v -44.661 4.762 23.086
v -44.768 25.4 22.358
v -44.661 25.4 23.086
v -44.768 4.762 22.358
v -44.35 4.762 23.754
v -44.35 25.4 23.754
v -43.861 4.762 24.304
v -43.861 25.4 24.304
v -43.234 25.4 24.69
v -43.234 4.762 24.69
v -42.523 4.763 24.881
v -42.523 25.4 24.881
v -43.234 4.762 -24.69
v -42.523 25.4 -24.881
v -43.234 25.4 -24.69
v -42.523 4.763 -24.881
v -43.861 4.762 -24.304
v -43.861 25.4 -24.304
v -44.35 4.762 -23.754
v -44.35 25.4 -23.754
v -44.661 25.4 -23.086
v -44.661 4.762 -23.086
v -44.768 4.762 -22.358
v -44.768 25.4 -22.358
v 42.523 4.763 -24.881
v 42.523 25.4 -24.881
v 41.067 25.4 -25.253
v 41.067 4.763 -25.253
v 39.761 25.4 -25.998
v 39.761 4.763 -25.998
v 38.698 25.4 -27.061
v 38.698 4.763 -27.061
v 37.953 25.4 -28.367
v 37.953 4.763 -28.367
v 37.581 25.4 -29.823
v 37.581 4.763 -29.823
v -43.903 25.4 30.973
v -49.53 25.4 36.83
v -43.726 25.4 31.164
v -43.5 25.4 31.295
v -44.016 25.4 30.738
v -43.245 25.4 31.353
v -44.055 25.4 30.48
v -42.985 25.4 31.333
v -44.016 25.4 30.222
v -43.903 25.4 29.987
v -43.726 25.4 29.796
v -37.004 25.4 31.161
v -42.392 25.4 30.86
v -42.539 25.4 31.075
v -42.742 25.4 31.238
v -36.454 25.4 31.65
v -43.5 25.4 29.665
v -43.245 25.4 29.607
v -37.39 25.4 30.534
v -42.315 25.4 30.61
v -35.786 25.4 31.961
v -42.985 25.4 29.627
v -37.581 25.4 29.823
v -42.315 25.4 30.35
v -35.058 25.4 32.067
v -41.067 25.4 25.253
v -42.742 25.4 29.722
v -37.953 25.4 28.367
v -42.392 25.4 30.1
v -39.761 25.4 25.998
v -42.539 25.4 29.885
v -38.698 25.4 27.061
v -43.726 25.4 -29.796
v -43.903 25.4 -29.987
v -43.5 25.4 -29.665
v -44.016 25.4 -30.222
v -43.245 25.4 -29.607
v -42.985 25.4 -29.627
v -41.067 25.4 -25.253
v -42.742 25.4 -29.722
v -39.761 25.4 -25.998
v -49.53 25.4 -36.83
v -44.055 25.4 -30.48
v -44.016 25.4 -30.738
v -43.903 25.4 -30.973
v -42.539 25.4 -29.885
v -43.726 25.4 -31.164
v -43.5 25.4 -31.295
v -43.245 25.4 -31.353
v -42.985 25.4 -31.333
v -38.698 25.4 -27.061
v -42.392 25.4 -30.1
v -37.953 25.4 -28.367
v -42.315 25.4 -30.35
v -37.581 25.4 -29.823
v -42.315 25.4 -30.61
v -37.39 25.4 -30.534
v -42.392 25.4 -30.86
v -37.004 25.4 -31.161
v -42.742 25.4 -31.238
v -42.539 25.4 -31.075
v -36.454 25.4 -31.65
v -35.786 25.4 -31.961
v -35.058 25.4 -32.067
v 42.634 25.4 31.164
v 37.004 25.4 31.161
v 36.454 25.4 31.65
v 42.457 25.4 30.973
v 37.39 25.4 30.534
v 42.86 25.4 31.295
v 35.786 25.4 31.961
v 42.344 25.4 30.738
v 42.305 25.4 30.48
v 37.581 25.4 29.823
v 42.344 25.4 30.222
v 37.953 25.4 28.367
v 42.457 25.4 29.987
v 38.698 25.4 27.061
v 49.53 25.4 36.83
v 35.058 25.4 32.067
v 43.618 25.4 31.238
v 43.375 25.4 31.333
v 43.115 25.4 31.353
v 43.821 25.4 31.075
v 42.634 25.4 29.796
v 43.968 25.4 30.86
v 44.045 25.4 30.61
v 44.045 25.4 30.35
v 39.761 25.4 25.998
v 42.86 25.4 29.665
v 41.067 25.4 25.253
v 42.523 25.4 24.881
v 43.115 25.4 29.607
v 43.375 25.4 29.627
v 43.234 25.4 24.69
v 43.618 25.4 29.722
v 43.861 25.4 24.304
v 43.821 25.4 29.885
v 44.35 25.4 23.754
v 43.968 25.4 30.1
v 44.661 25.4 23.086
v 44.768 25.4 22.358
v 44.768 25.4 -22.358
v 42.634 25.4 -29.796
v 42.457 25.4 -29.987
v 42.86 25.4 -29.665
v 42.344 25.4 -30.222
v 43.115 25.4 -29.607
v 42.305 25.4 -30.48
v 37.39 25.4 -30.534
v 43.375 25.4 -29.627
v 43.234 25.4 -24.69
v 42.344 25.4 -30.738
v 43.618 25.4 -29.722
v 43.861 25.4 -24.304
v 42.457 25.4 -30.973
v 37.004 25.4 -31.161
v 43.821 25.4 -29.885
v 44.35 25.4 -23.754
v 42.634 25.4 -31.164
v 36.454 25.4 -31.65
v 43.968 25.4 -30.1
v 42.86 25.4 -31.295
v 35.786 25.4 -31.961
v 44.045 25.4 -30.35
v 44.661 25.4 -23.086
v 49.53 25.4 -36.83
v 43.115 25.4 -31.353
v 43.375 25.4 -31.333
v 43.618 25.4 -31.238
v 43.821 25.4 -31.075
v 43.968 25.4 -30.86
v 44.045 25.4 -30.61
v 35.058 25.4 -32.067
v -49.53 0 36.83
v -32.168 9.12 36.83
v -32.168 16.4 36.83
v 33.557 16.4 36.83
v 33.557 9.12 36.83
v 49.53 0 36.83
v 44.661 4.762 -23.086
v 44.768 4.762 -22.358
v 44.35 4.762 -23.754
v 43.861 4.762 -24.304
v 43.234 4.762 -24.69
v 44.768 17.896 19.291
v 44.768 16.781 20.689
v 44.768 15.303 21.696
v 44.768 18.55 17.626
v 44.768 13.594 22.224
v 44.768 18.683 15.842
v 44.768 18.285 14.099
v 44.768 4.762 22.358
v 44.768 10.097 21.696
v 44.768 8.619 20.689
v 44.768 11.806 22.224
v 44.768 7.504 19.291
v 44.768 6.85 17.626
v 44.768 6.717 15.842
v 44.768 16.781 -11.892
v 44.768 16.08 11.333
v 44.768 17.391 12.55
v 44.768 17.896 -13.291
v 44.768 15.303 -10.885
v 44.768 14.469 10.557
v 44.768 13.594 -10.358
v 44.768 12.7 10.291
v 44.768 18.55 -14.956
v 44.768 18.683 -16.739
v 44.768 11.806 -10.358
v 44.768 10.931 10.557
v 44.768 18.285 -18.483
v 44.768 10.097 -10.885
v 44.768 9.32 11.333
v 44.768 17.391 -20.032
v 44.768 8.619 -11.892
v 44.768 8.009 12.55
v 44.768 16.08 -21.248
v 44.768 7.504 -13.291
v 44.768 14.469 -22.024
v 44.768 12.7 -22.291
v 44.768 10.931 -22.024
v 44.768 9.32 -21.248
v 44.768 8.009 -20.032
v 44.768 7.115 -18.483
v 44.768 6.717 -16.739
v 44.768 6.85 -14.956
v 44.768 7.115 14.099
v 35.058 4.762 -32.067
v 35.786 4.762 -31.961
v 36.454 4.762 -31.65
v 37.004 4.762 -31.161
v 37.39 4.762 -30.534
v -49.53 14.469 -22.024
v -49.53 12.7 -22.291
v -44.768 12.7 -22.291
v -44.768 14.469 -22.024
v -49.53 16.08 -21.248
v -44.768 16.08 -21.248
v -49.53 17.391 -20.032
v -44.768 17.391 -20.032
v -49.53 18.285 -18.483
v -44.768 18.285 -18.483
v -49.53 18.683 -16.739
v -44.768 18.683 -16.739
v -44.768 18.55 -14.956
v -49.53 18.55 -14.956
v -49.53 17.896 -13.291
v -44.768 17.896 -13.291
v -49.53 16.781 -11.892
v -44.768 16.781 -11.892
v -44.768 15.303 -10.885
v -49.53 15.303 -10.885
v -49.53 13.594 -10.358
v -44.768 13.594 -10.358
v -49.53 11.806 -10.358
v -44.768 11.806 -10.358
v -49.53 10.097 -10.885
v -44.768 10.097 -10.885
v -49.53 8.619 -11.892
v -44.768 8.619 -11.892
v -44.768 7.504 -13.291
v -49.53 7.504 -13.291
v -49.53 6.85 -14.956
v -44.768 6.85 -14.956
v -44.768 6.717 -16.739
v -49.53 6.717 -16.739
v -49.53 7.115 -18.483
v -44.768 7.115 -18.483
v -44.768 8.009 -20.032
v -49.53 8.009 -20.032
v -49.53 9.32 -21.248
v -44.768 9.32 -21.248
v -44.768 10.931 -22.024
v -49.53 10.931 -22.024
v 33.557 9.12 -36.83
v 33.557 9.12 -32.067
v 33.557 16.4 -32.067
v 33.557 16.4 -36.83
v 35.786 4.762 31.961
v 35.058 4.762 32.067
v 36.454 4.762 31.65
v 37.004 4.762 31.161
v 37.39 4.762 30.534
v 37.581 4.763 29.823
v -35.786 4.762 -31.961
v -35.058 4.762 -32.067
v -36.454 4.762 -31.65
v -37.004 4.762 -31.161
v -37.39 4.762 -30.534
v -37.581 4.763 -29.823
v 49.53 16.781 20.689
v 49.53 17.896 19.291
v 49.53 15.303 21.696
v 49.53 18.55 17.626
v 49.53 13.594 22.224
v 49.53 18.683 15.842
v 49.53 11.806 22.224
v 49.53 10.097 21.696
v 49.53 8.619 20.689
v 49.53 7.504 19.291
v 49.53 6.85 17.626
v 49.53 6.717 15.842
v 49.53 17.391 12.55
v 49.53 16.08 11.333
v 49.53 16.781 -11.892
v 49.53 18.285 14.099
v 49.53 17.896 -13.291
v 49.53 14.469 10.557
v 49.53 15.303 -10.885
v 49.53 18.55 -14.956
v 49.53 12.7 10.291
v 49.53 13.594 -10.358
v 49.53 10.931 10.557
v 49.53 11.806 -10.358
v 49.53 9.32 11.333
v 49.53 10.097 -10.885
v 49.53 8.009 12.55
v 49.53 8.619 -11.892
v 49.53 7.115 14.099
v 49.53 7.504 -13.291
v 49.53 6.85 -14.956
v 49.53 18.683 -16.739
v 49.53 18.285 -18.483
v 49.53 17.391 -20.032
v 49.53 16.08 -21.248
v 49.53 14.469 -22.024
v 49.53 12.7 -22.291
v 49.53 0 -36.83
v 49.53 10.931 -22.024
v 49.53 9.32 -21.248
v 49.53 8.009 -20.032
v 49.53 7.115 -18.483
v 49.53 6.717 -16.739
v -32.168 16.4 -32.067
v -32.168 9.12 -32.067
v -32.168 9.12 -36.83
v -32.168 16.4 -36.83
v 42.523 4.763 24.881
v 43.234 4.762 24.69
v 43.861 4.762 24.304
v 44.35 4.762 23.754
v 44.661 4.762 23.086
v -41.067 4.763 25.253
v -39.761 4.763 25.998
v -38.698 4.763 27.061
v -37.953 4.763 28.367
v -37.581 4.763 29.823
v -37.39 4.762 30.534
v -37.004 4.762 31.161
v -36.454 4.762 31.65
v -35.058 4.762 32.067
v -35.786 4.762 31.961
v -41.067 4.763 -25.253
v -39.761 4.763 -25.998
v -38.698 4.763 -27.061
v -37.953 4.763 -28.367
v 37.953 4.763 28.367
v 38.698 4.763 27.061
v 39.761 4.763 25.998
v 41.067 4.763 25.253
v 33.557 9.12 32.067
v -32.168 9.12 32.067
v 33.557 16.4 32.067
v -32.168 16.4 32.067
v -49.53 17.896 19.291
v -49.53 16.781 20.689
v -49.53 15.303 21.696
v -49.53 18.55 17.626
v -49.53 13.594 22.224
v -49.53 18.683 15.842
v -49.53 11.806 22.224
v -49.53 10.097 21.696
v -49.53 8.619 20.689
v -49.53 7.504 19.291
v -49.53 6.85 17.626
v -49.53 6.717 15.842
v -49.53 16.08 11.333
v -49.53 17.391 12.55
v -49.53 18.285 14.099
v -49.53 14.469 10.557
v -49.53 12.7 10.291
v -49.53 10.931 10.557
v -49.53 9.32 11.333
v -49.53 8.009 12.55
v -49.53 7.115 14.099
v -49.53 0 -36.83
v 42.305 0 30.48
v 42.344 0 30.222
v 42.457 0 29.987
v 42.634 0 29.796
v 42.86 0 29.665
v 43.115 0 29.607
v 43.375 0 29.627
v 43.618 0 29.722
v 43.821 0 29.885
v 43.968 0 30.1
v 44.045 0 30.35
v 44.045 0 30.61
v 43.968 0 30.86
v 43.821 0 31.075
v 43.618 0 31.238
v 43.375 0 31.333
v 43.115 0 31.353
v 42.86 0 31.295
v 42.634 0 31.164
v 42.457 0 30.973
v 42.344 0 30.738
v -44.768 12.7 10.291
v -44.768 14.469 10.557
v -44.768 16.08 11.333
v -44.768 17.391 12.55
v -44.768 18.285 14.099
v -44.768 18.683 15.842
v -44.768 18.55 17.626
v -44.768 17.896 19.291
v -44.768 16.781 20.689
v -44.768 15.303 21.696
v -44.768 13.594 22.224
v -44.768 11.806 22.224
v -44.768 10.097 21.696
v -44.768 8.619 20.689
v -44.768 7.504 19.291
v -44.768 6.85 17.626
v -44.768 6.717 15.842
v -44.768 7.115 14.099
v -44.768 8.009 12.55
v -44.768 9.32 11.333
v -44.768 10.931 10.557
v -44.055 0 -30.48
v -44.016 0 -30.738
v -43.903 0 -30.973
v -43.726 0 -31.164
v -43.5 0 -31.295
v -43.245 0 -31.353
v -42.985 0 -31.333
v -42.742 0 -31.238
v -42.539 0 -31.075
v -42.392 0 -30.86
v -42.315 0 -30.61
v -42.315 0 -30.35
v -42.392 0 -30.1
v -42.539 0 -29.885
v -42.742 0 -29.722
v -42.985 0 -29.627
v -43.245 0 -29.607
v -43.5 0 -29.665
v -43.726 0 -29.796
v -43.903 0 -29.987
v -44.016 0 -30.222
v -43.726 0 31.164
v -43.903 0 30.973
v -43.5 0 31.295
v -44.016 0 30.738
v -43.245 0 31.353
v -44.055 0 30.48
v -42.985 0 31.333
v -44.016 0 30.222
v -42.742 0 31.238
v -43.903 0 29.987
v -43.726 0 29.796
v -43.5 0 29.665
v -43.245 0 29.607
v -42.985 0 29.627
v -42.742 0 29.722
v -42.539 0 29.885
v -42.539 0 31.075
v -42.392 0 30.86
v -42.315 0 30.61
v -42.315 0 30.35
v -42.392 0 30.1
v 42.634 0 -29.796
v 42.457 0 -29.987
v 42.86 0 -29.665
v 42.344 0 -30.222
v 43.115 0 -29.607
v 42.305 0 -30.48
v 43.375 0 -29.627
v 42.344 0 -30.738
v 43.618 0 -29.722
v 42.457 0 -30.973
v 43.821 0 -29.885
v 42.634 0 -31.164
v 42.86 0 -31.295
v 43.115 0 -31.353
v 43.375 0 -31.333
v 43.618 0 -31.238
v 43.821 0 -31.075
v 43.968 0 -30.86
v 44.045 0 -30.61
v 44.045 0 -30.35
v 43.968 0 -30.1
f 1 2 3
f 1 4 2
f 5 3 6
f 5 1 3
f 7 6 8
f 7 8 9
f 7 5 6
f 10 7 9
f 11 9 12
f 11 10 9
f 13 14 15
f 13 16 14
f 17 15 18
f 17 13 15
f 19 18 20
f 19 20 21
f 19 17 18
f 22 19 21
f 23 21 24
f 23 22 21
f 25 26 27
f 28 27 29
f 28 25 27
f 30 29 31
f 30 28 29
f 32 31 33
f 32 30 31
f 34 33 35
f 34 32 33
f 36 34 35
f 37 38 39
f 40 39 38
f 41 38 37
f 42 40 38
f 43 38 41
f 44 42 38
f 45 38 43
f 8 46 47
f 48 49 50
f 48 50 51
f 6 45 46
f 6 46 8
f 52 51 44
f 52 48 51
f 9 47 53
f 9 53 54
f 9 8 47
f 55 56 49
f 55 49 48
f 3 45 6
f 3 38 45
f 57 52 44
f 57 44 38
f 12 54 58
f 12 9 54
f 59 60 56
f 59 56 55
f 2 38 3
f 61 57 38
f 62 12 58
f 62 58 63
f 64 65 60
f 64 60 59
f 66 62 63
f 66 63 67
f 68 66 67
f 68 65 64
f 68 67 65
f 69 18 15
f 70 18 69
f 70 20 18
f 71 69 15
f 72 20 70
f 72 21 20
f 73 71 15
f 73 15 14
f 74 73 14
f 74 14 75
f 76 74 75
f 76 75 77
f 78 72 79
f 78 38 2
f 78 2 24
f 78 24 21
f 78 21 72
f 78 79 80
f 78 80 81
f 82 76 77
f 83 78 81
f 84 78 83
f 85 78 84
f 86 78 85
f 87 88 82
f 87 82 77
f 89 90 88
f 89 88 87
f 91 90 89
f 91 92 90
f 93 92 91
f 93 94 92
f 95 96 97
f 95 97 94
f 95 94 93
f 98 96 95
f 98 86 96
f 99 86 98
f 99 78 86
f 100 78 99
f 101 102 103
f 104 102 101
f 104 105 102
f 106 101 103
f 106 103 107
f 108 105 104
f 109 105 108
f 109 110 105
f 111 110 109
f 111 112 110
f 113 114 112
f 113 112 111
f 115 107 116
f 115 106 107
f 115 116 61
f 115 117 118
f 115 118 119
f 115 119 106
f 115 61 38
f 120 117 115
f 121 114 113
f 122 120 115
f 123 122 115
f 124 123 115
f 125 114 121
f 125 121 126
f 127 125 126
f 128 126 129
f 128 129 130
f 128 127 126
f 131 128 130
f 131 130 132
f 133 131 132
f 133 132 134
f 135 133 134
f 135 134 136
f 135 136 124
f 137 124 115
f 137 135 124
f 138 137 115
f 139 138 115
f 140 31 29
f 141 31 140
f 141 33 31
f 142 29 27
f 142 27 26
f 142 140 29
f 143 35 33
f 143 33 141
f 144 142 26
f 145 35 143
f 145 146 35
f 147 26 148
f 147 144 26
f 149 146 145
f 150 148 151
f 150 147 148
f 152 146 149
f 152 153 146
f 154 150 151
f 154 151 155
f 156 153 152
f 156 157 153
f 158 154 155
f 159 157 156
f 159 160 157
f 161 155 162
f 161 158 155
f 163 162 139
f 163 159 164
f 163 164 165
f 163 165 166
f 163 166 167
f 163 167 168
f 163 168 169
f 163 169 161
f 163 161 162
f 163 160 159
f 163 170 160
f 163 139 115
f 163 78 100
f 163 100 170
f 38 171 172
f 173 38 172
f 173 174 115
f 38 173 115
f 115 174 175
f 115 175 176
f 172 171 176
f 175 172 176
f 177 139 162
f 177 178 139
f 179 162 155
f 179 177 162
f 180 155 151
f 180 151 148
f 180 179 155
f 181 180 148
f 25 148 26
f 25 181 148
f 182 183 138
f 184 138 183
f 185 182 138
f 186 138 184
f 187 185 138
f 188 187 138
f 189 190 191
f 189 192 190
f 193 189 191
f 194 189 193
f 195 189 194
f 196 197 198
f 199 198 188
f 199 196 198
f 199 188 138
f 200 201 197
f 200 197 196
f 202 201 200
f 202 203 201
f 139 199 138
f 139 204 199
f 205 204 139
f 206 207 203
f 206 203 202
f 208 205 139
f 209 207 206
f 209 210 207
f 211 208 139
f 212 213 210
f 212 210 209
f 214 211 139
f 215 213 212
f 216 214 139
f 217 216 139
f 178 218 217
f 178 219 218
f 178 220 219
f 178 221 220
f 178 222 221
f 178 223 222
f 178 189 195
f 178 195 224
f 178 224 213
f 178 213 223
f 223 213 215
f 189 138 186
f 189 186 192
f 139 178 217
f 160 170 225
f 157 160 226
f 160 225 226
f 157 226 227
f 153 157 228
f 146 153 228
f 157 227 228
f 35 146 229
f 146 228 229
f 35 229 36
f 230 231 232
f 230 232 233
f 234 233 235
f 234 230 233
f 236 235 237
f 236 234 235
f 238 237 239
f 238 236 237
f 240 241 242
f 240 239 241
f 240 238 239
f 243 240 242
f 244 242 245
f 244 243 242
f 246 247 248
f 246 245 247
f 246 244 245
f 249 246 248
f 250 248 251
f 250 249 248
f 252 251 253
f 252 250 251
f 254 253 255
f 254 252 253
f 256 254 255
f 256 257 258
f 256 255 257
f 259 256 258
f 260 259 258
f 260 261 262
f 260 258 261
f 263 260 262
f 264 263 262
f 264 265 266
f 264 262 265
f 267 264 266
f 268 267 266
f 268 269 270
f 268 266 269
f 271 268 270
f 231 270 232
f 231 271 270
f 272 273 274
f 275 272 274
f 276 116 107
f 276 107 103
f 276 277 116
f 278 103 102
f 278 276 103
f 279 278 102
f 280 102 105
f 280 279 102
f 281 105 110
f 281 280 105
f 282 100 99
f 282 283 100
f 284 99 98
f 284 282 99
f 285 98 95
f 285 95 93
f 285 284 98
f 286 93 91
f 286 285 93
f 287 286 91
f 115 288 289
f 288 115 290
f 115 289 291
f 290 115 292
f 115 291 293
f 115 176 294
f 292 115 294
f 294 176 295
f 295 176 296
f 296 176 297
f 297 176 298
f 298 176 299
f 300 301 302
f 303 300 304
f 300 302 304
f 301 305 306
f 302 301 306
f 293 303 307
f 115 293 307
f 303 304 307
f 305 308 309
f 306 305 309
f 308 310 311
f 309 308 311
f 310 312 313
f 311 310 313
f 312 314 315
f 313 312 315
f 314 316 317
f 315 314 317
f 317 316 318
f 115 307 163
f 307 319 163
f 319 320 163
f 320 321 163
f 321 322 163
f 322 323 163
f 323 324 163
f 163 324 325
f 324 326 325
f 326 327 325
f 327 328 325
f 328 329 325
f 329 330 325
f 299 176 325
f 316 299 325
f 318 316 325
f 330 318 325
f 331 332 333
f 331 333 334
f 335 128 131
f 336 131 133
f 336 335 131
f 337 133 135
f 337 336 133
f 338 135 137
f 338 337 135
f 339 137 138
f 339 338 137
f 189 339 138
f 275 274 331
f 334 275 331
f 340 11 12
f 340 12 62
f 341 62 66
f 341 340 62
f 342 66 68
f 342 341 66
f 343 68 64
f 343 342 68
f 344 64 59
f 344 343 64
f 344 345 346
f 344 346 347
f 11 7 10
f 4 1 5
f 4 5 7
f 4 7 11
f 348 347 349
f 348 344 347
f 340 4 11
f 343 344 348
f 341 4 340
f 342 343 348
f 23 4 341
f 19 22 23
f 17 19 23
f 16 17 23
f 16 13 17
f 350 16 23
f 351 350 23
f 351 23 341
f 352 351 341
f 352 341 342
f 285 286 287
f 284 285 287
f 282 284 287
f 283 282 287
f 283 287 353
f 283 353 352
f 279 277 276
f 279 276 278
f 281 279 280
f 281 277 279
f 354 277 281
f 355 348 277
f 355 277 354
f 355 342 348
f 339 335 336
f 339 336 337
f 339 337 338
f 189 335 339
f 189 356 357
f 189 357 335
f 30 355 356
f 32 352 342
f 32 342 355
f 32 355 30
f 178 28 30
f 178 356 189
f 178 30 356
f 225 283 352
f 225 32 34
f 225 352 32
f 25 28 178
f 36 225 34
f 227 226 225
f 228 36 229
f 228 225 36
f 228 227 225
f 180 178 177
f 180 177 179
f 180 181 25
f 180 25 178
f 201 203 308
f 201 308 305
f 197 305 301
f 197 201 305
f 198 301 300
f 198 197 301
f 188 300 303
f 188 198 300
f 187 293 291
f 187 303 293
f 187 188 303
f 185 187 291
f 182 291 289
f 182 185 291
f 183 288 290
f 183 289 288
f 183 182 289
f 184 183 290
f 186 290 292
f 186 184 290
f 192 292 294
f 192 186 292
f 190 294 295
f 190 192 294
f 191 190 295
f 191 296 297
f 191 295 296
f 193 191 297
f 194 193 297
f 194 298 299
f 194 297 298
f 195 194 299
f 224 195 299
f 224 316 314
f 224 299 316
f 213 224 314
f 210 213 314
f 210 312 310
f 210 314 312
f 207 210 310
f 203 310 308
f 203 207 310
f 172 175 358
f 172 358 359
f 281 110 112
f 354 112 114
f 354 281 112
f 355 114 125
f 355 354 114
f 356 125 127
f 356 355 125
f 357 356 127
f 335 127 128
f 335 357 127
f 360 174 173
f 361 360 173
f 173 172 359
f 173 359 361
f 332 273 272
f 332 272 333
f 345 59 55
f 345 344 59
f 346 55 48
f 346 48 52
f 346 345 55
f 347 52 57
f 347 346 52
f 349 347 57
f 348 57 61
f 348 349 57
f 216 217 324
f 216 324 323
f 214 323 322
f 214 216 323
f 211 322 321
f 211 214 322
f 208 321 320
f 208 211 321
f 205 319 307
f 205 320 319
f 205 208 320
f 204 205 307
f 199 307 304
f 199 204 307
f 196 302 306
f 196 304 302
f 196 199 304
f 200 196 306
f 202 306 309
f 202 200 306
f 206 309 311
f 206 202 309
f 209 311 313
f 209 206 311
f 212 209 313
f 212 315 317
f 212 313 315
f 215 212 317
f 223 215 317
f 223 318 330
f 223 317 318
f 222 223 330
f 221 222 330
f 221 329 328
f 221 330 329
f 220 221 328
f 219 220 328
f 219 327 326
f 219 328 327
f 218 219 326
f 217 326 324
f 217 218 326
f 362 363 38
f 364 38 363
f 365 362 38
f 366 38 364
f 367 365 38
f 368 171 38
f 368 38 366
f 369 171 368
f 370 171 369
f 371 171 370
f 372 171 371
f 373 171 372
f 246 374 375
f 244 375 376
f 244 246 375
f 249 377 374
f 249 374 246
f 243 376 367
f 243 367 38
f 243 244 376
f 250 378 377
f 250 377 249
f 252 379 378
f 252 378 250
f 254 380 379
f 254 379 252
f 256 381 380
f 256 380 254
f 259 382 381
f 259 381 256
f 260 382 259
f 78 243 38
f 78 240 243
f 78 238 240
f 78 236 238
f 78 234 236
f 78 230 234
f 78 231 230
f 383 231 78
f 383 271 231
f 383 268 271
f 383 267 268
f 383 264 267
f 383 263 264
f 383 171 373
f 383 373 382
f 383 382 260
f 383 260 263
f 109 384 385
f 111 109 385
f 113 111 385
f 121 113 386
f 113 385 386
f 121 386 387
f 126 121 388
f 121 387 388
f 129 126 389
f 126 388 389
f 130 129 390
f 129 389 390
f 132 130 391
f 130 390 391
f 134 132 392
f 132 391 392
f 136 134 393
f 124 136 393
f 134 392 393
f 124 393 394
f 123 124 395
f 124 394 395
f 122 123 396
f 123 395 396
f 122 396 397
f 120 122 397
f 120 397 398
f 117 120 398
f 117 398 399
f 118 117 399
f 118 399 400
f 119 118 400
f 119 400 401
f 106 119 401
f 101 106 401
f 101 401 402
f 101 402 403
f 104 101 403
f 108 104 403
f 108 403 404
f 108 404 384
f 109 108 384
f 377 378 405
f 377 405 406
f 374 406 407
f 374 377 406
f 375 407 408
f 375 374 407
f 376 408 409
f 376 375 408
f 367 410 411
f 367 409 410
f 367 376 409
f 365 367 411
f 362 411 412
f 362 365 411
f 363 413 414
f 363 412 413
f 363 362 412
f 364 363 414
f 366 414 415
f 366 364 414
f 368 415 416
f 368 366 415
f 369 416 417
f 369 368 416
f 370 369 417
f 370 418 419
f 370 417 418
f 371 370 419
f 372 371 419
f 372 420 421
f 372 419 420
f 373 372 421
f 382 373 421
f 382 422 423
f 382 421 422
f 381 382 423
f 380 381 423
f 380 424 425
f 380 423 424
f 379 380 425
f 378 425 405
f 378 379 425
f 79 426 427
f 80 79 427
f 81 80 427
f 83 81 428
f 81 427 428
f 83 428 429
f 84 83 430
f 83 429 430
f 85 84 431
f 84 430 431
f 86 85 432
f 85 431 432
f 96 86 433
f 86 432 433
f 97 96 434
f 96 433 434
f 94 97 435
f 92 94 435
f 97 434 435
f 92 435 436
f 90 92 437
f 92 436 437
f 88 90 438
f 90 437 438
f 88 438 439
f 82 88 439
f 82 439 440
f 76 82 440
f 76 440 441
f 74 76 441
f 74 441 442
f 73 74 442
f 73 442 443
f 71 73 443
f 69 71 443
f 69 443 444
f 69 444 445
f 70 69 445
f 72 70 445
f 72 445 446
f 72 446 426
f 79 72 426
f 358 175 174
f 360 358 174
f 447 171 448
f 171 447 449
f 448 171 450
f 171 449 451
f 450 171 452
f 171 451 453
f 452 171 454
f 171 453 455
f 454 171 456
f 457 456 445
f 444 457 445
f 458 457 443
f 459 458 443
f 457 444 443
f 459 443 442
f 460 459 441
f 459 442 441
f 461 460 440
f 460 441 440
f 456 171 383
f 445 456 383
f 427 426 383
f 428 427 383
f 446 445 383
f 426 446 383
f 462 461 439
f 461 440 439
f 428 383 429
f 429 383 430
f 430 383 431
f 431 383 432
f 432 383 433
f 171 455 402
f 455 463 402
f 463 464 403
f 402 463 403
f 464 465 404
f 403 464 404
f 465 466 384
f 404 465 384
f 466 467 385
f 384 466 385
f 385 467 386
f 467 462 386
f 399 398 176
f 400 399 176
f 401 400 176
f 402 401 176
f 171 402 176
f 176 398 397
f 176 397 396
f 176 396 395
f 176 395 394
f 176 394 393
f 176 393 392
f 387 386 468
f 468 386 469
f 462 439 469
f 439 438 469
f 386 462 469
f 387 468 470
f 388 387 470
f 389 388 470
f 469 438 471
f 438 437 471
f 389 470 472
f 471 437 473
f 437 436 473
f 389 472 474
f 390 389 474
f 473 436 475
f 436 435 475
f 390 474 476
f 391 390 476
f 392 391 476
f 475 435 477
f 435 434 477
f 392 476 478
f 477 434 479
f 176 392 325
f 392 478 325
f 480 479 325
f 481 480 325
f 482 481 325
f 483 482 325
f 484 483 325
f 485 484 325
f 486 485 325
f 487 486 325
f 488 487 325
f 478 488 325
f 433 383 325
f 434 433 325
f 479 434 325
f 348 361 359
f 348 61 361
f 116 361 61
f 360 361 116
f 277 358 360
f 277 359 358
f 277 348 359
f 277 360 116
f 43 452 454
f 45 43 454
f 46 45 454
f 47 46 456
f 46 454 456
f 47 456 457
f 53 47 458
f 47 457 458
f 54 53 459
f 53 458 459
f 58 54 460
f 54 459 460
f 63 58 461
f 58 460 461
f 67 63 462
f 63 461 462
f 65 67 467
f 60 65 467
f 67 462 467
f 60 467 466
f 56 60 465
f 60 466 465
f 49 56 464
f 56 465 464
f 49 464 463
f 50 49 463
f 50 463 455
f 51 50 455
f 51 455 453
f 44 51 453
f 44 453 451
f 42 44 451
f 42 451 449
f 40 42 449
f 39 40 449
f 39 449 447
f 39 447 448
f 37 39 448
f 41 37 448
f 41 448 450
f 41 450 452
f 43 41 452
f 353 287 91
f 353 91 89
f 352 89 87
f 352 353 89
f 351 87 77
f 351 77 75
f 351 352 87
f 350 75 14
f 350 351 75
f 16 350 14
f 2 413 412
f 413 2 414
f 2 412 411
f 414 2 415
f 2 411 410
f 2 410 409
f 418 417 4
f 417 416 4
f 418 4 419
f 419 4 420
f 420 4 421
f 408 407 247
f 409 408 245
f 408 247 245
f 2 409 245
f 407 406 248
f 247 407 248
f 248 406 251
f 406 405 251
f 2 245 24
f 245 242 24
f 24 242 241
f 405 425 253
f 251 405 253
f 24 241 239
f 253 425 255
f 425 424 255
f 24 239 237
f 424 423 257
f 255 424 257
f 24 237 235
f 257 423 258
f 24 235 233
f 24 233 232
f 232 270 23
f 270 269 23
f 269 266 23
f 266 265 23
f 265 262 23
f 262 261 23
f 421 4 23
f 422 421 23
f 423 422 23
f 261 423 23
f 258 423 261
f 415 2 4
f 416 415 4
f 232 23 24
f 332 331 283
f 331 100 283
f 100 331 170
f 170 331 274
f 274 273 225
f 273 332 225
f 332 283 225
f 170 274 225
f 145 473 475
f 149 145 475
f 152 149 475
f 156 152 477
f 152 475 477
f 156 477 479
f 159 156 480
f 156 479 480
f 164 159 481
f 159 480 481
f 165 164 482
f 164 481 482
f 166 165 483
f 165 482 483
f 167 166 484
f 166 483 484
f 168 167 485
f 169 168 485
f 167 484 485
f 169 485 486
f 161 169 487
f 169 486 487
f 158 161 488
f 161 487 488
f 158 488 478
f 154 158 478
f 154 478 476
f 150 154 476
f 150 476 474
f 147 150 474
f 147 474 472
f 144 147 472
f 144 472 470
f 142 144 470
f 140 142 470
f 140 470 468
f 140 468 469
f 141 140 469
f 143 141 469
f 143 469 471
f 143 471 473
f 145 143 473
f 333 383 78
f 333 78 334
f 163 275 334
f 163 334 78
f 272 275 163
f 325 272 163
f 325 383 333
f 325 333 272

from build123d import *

# Parameters (mm, degrees)
SKETCH1_W                    = 99.06
SKETCH1_H                    = 73.66
BOSS_EXTRUDE1_DEPTH          = 25.4
M2_2X0_45_TAPPED_HOLE2_D     = 1.75
M2_2X0_45_TAPPED_HOLE2_DEPTH = 30.48
M2_2X0_45_TAPPED_HOLE2_TIP   = 0.525753042
SHELL3_T                     = -4.7625
FILLET2_R                    = 2.54
CUT_EXTRUDE1_DEPTH           = 109.694491581
CUT_EXTRUDE1_DEPTH_BACK      = 109.694491581
SKETCH11_R                   = 6
CUT_EXTRUDE2_DEPTH           = 93.326466953
CUT_EXTRUDE2_DEPTH_BACK      = 93.326466953
SKETCH12_W                   = 65.724340076
SKETCH12_H                   = 7.280106329


with BuildPart() as part:
    # Sketch1 → Boss-Extrude1 (new body)
    with BuildSketch(Plane(origin=(0, 0, 0), x_dir=(1, 0, 0), z_dir=(0, 1, 0))):
        Rectangle(SKETCH1_W, SKETCH1_H)
    extrude(amount=BOSS_EXTRUDE1_DEPTH)

    # M2.2x0.45 Tapped Hole2
    with Locations(Plane(origin=(0, 25.4, 0), x_dir=(1, 0, 0), z_dir=(0, 1, 0))):
        with Locations((-43.18, 30.48), (43.18, 30.48), (43.18, -30.48), (-43.18, -30.48)):
            Hole(M2_2X0_45_TAPPED_HOLE2_D / 2, depth=M2_2X0_45_TAPPED_HOLE2_DEPTH)
            with Locations((0, 0, -(M2_2X0_45_TAPPED_HOLE2_DEPTH + M2_2X0_45_TAPPED_HOLE2_TIP / 2))):  # 118° drill point
                Cone(0, M2_2X0_45_TAPPED_HOLE2_D / 2, M2_2X0_45_TAPPED_HOLE2_TIP, mode=Mode.SUBTRACT)

    # Shell3
    shell3_openings = [part.faces().sort_by_distance(p)[0] for p in [
        (0, 25.4, 0),
    ]]
    offset(amount=SHELL3_T, openings=shell3_openings, kind=Kind.INTERSECTION)

    # Fillet2
    fillet2_edges = [part.edges().sort_by_distance(p)[0] for p in [
        (-44.7675, 15.08125, -25.070633124),
        (-37.770633124, 15.08125, 32.0675),
        (44.7675, 15.08125, 25.070633124),
        (37.770633124, 15.08125, -32.0675),
        (-44.7675, 15.08125, 25.070633124),
        (37.770633124, 15.08125, 32.0675),
        (44.7675, 15.08125, -25.070633124),
        (-37.770633124, 15.08125, -32.0675),
    ]]
    fillet(fillet2_edges, radius=FILLET2_R)

    # Sketch11 → Cut-Extrude1 (cut, two sides: drawn at the far end of the back side and taken through both)
    with BuildSketch(Plane(origin=(49.53, 0, 0), x_dir=(0, 0, -1), z_dir=(1, 0, 0)).offset(-CUT_EXTRUDE1_DEPTH_BACK)):
        with Locations((-16.290648395, 12.7)):
            Circle(SKETCH11_R)
        with Locations((16.290648395, 12.7)):
            Circle(SKETCH11_R)
    extrude(amount=CUT_EXTRUDE1_DEPTH + CUT_EXTRUDE1_DEPTH_BACK, mode=Mode.SUBTRACT)

    # Sketch12 → Cut-Extrude2 (cut, two sides: drawn at the far end of the back side and taken through both)
    with BuildSketch(Plane(origin=(0, 0, -36.83), x_dir=(-1, 0, 0), z_dir=(0, 0, -1)).offset(-CUT_EXTRUDE2_DEPTH_BACK)):
        with Locations((-0.694647497, 12.759946836)):
            Rectangle(SKETCH12_W, SKETCH12_H)
    extrude(amount=CUT_EXTRUDE2_DEPTH + CUT_EXTRUDE2_DEPTH_BACK, mode=Mode.SUBTRACT)


solid = part.part
